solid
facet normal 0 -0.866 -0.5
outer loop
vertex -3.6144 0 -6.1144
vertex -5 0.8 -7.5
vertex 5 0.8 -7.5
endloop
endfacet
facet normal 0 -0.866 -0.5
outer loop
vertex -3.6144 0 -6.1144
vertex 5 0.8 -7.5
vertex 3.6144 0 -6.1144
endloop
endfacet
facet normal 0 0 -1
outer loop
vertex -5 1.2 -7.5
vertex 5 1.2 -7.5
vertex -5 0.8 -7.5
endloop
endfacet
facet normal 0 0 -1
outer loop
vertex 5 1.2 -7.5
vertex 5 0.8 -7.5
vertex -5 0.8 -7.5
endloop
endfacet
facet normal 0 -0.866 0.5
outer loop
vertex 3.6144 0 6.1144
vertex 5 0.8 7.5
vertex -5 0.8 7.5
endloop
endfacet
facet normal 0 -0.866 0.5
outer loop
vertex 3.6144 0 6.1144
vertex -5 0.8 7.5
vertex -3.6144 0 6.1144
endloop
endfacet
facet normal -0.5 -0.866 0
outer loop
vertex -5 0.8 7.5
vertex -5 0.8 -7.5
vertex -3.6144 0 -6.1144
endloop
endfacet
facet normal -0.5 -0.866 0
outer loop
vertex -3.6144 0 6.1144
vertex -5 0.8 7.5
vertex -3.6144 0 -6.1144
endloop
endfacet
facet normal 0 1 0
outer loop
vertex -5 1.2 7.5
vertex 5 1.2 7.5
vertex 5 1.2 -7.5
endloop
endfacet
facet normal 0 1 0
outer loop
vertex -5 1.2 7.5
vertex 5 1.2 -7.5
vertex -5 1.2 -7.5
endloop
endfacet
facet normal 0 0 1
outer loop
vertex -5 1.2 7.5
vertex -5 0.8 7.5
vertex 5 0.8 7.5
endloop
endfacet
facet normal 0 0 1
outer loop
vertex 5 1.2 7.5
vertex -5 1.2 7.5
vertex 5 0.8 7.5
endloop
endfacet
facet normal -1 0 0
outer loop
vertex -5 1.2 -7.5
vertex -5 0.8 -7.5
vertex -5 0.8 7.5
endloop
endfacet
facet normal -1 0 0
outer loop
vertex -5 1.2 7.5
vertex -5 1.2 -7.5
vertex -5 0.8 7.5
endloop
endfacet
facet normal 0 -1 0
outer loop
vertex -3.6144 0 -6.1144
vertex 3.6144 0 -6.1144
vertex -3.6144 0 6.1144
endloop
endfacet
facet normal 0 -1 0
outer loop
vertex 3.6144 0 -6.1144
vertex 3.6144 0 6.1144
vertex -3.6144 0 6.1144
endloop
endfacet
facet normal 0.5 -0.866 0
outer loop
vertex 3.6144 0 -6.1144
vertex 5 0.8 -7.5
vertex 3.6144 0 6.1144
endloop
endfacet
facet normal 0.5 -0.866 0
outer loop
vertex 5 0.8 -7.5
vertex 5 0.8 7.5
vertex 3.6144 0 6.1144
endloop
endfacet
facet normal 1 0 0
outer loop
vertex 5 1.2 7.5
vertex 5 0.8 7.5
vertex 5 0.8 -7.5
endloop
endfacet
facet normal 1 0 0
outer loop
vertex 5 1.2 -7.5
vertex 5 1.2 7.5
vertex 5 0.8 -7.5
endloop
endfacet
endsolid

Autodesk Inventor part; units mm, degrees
ref_plane "YZ Plane" through (0, 0, 0) normal (1, 0, 0) x (0, 1, 0)
ref_plane "XZ Plane" through (0, 0, 0) normal (0, 1, 0) x (-1, 0, 0)
ref_plane "XY Plane" through (0, 0, 0) normal (0, 0, 1) x (1, 0, 0)
sketch "Sketch1" plane through (0, 0, 0) normal (0, 1, 0) x (-1, 0, 0)
  line L0 (5, 7.5) -> (-5, 7.5)
  line L1 (-5, 7.5) -> (-5, -7.5)
  line L2 (-5, -7.5) -> (5, -7.5)
  line L3 (5, -7.5) -> (5, 7.5)
  point P0 (0, 0)
  dimension "d0" = 15
  dimension "d1" = 10
  dimension "d2" = 5
  dimension "d3" = 7.5
extrude "Extrusion1" add sketch "Sketch1" along normal blind 1.2
sketch "Sketch2" plane through (5, 0, 7.5) normal (1, 0, 0) x (0, 0, -1)
  line L0 (0, 0) -> (0, 1.2) projected
  line L1 (0, 0) -> (0, 0.8)
  line L2 (0, 0.8) -> (1.3856, 0)
  line L3 (0, 0) -> (15, 0) projected
  line L4 (0, 0) -> (1.3856, 0)
  line L5 (7.5, 0) -> (7.5, 5.1118)
  line L6 (15, 0) -> (15, 1.2)
  line L7 (15, 0) -> (15, 0.8)
  line L8 (15, 0.8) -> (13.6144, 0)
  line L9 (15, 0) -> (13.6144, 0)
  dimension "d6" = 0.8
  dimension "d7" = 30
extrude "Extrusion2" cut sketch "Sketch2" against normal through all
sketch "Sketch3" plane through (-5, 1.2, 7.5) normal (0, 0, 1) x (1, 0, 0)
  line L0 (0, -1.2) -> (0, -0.4) projected
  line L1 (0, -0.4) -> (0, -1.2)
  line L2 (0, -1.2) -> (1.3856, -1.2)
  line L3 (10, -1.2) -> (0, -1.2) projected
  line L4 (0, -0.4) -> (1.3856, -1.2)
  line L5 (5, -1.2) -> (5, 0.9136)
  line L6 (10, -1.2) -> (10, -0.4)
  line L7 (10, -0.4) -> (10, -1.2)
  line L8 (10, -1.2) -> (8.6144, -1.2)
  line L9 (10, -0.4) -> (8.6144, -1.2)
  dimension "d10" = 30
extrude "Extrusion3" cut sketch "Sketch3" against normal through all
equation "\"d2\" = 0.5 * d1"
equation "\"d3\" = 0.5 * d0"
properties part number "ChairTop"
